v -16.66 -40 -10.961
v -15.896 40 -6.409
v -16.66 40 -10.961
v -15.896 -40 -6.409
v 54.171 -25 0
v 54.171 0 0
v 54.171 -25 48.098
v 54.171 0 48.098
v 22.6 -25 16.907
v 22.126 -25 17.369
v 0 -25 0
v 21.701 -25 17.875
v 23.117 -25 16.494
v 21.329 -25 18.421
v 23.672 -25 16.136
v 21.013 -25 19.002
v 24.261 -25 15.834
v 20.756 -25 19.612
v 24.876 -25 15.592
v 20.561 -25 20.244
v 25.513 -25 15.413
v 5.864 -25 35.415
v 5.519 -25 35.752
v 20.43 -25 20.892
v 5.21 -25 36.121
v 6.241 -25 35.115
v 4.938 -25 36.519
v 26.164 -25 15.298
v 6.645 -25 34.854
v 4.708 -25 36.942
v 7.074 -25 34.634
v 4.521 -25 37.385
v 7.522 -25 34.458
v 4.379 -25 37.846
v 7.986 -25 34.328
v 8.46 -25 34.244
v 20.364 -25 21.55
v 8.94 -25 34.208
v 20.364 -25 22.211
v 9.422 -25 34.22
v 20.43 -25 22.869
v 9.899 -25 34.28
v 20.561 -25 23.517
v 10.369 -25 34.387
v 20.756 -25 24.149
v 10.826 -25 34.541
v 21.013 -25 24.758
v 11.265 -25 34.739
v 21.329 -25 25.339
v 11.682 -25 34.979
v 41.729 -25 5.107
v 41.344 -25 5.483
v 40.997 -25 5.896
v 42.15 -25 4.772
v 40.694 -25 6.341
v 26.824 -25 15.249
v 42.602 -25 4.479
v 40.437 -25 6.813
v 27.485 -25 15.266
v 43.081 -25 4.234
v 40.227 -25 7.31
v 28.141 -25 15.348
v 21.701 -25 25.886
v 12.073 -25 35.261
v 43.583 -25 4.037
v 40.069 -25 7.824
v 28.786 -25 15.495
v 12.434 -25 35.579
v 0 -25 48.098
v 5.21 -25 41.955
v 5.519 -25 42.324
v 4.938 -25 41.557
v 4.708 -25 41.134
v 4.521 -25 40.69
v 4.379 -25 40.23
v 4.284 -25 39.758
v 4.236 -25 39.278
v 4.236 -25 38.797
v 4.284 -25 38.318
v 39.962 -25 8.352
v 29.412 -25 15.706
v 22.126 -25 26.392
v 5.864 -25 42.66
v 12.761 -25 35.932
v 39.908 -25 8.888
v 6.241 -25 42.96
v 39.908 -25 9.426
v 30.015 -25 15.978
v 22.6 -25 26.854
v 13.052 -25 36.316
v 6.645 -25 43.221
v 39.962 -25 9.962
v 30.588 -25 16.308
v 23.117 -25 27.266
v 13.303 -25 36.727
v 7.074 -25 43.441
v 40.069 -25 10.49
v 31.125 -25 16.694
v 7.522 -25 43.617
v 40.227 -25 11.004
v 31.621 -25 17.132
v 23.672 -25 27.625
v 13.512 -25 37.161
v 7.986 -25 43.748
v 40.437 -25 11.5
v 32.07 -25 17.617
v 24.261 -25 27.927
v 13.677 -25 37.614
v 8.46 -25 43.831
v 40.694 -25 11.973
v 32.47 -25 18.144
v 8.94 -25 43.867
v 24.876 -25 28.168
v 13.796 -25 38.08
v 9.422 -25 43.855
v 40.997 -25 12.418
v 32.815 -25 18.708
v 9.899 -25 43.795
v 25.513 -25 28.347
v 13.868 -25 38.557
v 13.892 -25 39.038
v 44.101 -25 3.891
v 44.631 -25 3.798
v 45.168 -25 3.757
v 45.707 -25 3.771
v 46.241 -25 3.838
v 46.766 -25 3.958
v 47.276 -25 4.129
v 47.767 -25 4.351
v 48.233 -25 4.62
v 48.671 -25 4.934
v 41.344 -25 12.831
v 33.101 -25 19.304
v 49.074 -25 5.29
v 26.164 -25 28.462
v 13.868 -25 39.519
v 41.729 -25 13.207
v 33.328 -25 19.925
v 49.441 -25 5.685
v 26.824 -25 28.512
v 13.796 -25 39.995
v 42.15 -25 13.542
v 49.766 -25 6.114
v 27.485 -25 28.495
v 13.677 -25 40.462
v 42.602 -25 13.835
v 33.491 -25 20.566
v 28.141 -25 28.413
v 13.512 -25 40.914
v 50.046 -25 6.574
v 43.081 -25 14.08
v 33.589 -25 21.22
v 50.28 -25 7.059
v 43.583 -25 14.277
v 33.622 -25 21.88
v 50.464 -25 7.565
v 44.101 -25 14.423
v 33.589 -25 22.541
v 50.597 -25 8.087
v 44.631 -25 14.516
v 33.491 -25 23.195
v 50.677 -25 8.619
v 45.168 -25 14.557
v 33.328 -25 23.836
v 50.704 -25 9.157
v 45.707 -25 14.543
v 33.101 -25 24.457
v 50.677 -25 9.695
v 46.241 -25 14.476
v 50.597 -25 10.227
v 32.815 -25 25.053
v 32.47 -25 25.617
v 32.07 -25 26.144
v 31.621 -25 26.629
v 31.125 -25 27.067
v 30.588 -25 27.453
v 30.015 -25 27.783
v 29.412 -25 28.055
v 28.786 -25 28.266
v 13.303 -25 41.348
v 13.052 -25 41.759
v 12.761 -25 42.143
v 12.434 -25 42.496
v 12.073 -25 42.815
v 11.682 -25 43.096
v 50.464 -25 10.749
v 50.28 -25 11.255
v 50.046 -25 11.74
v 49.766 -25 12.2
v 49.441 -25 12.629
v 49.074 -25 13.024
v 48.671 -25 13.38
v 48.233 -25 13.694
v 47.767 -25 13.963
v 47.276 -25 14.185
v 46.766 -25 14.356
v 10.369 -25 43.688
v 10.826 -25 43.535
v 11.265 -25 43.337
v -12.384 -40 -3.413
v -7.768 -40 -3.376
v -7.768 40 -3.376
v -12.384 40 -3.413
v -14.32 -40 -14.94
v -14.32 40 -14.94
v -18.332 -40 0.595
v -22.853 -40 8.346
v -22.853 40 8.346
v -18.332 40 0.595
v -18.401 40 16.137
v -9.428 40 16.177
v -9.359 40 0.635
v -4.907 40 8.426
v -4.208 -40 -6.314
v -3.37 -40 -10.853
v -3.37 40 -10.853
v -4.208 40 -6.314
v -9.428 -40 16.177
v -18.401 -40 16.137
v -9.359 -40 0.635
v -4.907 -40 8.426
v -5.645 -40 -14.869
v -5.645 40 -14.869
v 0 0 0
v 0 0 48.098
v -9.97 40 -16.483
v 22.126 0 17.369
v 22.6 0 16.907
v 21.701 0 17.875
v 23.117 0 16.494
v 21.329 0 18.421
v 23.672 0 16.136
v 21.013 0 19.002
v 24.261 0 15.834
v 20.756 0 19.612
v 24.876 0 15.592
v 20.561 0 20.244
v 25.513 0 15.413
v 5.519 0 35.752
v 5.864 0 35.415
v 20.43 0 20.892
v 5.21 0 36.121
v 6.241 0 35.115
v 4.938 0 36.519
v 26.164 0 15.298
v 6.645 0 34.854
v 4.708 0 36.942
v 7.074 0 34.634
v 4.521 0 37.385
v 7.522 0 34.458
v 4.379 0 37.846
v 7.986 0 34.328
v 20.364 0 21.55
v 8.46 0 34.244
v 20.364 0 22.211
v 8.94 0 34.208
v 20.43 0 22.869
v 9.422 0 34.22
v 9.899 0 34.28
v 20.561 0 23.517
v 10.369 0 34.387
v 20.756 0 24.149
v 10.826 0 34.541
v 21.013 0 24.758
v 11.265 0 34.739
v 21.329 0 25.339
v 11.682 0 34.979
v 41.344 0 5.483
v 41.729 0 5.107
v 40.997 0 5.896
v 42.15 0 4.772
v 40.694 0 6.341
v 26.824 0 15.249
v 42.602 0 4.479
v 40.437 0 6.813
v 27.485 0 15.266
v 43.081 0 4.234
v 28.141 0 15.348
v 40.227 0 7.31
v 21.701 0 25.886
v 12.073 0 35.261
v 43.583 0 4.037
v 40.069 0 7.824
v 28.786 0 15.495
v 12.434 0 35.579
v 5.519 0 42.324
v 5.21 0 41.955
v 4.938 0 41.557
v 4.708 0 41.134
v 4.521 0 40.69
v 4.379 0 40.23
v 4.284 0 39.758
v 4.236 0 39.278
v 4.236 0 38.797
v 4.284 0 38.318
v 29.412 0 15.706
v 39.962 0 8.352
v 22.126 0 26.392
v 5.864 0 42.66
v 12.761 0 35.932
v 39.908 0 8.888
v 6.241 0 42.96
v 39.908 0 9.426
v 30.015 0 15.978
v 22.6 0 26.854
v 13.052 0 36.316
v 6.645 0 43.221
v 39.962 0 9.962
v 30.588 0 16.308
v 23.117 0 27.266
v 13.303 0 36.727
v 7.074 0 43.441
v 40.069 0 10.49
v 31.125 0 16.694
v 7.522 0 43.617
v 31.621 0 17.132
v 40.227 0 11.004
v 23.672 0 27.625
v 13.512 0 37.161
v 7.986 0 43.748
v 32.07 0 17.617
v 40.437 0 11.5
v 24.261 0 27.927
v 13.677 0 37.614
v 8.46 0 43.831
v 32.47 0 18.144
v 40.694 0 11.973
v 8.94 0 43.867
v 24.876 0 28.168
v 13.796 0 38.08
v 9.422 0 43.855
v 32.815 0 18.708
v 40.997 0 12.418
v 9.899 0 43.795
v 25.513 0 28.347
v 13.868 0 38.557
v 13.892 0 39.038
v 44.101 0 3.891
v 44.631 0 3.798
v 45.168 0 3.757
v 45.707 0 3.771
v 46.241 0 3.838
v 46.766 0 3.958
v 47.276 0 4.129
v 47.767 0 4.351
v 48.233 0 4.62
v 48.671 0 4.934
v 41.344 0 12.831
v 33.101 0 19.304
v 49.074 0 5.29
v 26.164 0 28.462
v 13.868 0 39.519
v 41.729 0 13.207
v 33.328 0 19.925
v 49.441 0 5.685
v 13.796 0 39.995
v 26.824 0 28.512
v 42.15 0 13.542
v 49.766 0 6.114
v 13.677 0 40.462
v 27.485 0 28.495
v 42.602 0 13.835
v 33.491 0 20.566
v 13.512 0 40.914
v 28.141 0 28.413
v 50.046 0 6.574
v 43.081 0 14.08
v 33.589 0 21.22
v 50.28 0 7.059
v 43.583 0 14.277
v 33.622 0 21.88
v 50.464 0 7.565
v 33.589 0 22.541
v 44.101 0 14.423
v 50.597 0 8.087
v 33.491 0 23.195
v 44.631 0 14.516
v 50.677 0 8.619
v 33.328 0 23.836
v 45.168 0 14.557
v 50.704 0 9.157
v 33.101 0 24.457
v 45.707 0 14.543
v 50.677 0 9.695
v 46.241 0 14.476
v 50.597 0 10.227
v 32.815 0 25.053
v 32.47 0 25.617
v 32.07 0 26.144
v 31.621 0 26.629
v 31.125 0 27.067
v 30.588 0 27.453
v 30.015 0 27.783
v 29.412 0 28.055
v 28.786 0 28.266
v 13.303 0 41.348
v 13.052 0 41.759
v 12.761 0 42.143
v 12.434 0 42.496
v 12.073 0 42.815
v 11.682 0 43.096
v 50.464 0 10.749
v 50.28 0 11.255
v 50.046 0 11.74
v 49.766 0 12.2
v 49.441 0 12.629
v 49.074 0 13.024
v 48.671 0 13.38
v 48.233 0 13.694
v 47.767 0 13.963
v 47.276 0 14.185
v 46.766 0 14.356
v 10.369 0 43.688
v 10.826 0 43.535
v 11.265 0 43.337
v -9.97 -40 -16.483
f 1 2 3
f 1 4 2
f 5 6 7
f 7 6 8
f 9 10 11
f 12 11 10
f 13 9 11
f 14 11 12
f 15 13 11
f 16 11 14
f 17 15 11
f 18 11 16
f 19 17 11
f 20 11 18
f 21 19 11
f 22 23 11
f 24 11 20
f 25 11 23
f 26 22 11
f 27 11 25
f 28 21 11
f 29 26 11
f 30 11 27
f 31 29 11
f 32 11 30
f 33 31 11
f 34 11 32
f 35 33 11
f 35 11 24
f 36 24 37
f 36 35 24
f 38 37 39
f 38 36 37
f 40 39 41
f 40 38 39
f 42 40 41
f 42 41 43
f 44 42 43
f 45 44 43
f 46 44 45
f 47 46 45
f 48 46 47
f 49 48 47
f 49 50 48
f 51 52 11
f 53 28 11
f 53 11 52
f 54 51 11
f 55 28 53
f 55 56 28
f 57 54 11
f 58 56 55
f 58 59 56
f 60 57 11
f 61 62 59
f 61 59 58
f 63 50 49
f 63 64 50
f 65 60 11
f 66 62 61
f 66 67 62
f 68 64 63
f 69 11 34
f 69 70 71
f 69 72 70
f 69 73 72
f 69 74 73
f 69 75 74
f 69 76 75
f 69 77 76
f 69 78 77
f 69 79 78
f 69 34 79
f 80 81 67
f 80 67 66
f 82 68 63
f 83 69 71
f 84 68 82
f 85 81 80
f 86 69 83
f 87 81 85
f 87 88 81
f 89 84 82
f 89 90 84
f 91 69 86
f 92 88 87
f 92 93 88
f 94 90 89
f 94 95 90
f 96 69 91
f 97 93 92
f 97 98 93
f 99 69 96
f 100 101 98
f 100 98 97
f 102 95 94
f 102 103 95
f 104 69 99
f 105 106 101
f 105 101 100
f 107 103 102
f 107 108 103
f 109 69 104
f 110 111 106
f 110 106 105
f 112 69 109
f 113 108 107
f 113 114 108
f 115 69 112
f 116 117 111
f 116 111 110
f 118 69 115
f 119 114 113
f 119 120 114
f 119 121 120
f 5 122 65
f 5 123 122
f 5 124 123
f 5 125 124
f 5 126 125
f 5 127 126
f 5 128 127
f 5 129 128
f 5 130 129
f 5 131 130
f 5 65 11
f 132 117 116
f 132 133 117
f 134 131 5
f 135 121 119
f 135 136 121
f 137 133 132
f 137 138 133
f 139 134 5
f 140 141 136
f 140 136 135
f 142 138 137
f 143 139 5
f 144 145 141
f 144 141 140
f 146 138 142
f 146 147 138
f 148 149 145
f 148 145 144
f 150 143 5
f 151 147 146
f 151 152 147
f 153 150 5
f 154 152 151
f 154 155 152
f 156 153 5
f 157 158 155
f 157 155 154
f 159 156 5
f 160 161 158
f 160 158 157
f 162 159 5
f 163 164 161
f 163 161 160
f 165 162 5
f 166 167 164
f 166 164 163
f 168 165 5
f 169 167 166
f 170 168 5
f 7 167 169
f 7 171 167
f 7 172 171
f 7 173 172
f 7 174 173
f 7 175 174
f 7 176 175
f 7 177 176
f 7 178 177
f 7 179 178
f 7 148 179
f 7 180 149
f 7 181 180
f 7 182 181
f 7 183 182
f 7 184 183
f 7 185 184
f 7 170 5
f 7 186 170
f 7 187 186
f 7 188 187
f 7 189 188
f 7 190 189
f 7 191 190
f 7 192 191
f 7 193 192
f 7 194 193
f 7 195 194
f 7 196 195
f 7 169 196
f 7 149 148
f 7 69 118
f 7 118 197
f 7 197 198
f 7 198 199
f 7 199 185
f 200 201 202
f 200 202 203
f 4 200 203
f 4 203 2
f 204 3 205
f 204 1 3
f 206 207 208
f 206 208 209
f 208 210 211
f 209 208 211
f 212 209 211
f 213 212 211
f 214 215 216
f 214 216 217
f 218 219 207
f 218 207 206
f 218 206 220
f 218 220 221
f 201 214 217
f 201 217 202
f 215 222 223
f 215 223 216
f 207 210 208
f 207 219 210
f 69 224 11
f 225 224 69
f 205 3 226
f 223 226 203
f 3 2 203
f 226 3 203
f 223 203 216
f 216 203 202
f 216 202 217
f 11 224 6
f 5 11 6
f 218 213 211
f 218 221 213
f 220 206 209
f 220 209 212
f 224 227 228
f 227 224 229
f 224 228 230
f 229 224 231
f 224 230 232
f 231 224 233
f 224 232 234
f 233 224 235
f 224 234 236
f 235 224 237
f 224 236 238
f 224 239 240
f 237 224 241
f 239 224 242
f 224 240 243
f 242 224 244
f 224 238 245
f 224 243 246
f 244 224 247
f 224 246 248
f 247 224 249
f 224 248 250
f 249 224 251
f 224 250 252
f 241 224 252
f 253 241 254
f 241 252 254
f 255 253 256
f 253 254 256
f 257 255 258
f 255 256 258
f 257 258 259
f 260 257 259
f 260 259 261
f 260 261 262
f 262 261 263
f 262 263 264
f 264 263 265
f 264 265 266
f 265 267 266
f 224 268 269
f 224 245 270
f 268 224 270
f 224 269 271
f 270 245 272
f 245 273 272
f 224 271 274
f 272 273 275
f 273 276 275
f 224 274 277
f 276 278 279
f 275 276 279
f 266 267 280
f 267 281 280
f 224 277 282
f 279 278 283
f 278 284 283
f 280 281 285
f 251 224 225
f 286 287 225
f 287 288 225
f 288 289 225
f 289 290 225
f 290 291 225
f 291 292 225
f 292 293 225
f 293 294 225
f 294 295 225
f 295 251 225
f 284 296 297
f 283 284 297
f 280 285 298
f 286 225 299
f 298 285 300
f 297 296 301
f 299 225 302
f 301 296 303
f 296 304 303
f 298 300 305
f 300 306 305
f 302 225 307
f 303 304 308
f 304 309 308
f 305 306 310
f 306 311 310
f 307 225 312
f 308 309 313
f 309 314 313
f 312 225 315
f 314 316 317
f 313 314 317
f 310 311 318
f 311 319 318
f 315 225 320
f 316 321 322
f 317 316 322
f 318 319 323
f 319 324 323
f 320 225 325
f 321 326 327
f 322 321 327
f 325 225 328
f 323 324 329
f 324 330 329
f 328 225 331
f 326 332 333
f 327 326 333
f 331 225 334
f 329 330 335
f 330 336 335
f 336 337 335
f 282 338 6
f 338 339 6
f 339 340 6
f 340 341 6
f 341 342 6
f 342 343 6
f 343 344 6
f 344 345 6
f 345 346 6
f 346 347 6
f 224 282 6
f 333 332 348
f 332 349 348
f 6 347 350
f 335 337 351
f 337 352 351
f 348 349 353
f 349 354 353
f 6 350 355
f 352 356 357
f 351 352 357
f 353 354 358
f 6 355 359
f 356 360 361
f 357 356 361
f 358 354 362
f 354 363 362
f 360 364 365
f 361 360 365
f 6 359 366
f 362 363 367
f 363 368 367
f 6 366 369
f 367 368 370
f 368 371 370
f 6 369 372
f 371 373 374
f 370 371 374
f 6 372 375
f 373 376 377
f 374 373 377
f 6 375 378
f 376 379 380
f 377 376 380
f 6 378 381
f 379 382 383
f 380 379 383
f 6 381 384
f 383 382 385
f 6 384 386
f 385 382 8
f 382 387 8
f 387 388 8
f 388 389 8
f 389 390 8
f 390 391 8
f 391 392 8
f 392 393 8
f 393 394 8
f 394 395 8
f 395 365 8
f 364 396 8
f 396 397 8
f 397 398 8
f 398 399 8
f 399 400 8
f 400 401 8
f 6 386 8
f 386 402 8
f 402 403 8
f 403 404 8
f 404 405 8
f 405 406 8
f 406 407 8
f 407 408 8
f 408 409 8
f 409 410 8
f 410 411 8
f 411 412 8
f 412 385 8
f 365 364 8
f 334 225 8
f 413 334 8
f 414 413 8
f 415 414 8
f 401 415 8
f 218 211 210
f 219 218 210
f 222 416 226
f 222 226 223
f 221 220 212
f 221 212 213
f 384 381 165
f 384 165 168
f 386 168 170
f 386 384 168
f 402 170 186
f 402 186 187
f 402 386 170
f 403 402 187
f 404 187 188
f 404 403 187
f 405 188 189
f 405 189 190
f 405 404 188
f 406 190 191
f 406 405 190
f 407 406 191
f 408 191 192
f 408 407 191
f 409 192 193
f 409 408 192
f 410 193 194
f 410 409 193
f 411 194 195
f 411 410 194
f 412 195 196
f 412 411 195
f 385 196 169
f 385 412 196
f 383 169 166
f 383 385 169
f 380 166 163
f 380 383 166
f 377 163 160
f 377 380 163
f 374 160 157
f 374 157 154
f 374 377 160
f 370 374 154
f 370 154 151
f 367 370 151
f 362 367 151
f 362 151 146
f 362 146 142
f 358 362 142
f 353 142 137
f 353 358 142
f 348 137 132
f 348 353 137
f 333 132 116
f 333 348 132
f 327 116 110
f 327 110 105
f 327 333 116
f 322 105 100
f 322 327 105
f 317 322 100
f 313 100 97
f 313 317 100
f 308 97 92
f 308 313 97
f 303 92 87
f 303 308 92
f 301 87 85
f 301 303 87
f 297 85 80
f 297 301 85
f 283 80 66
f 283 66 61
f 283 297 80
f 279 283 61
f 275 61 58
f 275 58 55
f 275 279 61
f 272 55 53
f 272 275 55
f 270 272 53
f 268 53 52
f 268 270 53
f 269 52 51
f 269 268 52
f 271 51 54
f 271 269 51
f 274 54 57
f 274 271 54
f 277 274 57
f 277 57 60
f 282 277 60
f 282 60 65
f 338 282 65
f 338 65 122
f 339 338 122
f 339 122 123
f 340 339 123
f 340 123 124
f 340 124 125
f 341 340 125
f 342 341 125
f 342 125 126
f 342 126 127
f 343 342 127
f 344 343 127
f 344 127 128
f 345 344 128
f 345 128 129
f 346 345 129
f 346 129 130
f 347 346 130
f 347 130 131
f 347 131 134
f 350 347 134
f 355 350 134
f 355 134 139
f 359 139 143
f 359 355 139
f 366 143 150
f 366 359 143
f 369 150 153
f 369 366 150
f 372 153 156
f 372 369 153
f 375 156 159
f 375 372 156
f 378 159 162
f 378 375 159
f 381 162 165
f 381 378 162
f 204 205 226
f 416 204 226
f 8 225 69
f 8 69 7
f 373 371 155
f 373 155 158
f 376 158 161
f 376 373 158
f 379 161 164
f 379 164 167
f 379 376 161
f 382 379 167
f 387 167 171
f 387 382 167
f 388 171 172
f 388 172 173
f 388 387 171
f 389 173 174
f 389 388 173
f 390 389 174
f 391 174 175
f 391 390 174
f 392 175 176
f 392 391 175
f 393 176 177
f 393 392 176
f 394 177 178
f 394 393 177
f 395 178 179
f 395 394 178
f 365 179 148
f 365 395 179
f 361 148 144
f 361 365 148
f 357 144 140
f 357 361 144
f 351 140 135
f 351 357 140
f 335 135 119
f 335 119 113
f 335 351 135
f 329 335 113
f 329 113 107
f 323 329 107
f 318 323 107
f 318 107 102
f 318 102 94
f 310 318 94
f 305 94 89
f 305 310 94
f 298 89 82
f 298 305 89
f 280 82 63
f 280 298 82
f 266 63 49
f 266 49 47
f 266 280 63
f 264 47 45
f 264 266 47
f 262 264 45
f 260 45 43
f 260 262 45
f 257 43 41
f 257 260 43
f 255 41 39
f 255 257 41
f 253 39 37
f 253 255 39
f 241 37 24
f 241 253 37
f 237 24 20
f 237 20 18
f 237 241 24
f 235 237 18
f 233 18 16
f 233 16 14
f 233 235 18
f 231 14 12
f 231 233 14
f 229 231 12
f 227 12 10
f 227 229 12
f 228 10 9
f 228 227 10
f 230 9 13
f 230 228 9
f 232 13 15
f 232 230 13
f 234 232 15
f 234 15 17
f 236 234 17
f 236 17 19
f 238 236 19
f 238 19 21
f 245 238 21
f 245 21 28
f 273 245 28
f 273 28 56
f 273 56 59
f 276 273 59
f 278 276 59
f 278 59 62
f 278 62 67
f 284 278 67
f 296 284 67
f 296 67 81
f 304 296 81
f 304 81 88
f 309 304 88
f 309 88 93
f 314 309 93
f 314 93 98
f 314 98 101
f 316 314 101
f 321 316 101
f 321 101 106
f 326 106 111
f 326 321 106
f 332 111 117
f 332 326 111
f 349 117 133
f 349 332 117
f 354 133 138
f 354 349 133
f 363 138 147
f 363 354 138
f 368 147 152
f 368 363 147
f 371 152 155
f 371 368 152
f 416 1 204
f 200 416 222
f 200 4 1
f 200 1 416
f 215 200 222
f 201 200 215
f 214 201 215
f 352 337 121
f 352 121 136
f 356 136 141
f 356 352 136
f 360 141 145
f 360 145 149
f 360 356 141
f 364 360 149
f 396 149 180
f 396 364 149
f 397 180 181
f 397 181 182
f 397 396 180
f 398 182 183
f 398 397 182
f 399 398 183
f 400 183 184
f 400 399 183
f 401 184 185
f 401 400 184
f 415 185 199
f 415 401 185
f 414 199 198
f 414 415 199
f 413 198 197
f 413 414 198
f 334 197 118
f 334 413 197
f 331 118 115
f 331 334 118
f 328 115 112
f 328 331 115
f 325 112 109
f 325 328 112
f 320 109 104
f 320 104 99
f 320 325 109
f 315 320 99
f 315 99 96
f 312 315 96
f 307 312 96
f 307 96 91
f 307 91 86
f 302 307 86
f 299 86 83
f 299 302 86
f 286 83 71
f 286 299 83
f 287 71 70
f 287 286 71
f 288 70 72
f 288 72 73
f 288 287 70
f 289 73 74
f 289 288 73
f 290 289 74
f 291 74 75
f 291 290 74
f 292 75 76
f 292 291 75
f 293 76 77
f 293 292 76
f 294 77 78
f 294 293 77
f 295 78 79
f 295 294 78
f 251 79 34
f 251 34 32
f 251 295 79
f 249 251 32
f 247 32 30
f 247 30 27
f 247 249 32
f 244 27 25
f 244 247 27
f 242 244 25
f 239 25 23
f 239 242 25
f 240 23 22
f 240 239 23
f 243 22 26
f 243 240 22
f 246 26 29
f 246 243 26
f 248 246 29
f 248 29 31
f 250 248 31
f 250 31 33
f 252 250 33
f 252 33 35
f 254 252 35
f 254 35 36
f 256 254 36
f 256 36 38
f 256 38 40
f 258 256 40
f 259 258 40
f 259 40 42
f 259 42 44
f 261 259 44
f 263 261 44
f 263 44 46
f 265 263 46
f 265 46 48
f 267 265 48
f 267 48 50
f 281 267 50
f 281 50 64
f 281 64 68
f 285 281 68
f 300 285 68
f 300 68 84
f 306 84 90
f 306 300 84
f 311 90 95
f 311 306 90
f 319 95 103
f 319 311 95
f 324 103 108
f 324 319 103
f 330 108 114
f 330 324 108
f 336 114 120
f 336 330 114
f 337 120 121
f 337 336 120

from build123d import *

# Parameters (mm, degrees)
F0_W     = 54.170746
F0_H     = 48.098229
F0_R     = 6.633369
F0_R_2   = 5.401238
F0_R_3   = 4.831014
F1_DEPTH = 25
F3_DEPTH = 40
F5_DEPTH = 40


with BuildPart() as f1:
    # F0 (on Front) → F1 (new body)
    with BuildSketch(Plane.XZ):
        with Locations((27.085373, 24.049114)):
            Rectangle(F0_W, F0_H)
        with Locations((26.988985, 21.880355)):
            Circle(F0_R, mode=Mode.SUBTRACT)
        with Locations((45.302939, 9.156978)):
            Circle(F0_R_2, mode=Mode.SUBTRACT)
        with Locations((9.060588, 39.037641)):
            Circle(F0_R_3, mode=Mode.SUBTRACT)
    extrude(amount=F1_DEPTH)


with BuildPart() as f3:
    # F2 (on Front) → F3 (new body, symmetric)
    with BuildSketch(Plane.XZ):
        Polygon((-14.320178, -14.939623), (-9.969909, -16.483267), (-5.645174, -14.869468), (-3.369565, -10.853341), (-4.207864, -6.314075), (-7.767823, -3.375644), (-12.383696, -3.412973), (-15.895666, -6.408594), (-16.660442, -10.960824), align=None)
    extrude(amount=F3_DEPTH, both=True)


with BuildPart() as f5:
    # F4 (on Front) → F5 (new body, symmetric)
    with BuildSketch(Plane.XZ):
        Polygon((-18.401282, 16.136957), (-22.85331, 8.345908), (-18.332078, 0.594815), (-9.358818, 0.63477), (-4.90679, 8.425818), (-9.428022, 16.176911), align=None)
    extrude(amount=F5_DEPTH, both=True)


solid = Compound([f1.part, f3.part, f5.part])
